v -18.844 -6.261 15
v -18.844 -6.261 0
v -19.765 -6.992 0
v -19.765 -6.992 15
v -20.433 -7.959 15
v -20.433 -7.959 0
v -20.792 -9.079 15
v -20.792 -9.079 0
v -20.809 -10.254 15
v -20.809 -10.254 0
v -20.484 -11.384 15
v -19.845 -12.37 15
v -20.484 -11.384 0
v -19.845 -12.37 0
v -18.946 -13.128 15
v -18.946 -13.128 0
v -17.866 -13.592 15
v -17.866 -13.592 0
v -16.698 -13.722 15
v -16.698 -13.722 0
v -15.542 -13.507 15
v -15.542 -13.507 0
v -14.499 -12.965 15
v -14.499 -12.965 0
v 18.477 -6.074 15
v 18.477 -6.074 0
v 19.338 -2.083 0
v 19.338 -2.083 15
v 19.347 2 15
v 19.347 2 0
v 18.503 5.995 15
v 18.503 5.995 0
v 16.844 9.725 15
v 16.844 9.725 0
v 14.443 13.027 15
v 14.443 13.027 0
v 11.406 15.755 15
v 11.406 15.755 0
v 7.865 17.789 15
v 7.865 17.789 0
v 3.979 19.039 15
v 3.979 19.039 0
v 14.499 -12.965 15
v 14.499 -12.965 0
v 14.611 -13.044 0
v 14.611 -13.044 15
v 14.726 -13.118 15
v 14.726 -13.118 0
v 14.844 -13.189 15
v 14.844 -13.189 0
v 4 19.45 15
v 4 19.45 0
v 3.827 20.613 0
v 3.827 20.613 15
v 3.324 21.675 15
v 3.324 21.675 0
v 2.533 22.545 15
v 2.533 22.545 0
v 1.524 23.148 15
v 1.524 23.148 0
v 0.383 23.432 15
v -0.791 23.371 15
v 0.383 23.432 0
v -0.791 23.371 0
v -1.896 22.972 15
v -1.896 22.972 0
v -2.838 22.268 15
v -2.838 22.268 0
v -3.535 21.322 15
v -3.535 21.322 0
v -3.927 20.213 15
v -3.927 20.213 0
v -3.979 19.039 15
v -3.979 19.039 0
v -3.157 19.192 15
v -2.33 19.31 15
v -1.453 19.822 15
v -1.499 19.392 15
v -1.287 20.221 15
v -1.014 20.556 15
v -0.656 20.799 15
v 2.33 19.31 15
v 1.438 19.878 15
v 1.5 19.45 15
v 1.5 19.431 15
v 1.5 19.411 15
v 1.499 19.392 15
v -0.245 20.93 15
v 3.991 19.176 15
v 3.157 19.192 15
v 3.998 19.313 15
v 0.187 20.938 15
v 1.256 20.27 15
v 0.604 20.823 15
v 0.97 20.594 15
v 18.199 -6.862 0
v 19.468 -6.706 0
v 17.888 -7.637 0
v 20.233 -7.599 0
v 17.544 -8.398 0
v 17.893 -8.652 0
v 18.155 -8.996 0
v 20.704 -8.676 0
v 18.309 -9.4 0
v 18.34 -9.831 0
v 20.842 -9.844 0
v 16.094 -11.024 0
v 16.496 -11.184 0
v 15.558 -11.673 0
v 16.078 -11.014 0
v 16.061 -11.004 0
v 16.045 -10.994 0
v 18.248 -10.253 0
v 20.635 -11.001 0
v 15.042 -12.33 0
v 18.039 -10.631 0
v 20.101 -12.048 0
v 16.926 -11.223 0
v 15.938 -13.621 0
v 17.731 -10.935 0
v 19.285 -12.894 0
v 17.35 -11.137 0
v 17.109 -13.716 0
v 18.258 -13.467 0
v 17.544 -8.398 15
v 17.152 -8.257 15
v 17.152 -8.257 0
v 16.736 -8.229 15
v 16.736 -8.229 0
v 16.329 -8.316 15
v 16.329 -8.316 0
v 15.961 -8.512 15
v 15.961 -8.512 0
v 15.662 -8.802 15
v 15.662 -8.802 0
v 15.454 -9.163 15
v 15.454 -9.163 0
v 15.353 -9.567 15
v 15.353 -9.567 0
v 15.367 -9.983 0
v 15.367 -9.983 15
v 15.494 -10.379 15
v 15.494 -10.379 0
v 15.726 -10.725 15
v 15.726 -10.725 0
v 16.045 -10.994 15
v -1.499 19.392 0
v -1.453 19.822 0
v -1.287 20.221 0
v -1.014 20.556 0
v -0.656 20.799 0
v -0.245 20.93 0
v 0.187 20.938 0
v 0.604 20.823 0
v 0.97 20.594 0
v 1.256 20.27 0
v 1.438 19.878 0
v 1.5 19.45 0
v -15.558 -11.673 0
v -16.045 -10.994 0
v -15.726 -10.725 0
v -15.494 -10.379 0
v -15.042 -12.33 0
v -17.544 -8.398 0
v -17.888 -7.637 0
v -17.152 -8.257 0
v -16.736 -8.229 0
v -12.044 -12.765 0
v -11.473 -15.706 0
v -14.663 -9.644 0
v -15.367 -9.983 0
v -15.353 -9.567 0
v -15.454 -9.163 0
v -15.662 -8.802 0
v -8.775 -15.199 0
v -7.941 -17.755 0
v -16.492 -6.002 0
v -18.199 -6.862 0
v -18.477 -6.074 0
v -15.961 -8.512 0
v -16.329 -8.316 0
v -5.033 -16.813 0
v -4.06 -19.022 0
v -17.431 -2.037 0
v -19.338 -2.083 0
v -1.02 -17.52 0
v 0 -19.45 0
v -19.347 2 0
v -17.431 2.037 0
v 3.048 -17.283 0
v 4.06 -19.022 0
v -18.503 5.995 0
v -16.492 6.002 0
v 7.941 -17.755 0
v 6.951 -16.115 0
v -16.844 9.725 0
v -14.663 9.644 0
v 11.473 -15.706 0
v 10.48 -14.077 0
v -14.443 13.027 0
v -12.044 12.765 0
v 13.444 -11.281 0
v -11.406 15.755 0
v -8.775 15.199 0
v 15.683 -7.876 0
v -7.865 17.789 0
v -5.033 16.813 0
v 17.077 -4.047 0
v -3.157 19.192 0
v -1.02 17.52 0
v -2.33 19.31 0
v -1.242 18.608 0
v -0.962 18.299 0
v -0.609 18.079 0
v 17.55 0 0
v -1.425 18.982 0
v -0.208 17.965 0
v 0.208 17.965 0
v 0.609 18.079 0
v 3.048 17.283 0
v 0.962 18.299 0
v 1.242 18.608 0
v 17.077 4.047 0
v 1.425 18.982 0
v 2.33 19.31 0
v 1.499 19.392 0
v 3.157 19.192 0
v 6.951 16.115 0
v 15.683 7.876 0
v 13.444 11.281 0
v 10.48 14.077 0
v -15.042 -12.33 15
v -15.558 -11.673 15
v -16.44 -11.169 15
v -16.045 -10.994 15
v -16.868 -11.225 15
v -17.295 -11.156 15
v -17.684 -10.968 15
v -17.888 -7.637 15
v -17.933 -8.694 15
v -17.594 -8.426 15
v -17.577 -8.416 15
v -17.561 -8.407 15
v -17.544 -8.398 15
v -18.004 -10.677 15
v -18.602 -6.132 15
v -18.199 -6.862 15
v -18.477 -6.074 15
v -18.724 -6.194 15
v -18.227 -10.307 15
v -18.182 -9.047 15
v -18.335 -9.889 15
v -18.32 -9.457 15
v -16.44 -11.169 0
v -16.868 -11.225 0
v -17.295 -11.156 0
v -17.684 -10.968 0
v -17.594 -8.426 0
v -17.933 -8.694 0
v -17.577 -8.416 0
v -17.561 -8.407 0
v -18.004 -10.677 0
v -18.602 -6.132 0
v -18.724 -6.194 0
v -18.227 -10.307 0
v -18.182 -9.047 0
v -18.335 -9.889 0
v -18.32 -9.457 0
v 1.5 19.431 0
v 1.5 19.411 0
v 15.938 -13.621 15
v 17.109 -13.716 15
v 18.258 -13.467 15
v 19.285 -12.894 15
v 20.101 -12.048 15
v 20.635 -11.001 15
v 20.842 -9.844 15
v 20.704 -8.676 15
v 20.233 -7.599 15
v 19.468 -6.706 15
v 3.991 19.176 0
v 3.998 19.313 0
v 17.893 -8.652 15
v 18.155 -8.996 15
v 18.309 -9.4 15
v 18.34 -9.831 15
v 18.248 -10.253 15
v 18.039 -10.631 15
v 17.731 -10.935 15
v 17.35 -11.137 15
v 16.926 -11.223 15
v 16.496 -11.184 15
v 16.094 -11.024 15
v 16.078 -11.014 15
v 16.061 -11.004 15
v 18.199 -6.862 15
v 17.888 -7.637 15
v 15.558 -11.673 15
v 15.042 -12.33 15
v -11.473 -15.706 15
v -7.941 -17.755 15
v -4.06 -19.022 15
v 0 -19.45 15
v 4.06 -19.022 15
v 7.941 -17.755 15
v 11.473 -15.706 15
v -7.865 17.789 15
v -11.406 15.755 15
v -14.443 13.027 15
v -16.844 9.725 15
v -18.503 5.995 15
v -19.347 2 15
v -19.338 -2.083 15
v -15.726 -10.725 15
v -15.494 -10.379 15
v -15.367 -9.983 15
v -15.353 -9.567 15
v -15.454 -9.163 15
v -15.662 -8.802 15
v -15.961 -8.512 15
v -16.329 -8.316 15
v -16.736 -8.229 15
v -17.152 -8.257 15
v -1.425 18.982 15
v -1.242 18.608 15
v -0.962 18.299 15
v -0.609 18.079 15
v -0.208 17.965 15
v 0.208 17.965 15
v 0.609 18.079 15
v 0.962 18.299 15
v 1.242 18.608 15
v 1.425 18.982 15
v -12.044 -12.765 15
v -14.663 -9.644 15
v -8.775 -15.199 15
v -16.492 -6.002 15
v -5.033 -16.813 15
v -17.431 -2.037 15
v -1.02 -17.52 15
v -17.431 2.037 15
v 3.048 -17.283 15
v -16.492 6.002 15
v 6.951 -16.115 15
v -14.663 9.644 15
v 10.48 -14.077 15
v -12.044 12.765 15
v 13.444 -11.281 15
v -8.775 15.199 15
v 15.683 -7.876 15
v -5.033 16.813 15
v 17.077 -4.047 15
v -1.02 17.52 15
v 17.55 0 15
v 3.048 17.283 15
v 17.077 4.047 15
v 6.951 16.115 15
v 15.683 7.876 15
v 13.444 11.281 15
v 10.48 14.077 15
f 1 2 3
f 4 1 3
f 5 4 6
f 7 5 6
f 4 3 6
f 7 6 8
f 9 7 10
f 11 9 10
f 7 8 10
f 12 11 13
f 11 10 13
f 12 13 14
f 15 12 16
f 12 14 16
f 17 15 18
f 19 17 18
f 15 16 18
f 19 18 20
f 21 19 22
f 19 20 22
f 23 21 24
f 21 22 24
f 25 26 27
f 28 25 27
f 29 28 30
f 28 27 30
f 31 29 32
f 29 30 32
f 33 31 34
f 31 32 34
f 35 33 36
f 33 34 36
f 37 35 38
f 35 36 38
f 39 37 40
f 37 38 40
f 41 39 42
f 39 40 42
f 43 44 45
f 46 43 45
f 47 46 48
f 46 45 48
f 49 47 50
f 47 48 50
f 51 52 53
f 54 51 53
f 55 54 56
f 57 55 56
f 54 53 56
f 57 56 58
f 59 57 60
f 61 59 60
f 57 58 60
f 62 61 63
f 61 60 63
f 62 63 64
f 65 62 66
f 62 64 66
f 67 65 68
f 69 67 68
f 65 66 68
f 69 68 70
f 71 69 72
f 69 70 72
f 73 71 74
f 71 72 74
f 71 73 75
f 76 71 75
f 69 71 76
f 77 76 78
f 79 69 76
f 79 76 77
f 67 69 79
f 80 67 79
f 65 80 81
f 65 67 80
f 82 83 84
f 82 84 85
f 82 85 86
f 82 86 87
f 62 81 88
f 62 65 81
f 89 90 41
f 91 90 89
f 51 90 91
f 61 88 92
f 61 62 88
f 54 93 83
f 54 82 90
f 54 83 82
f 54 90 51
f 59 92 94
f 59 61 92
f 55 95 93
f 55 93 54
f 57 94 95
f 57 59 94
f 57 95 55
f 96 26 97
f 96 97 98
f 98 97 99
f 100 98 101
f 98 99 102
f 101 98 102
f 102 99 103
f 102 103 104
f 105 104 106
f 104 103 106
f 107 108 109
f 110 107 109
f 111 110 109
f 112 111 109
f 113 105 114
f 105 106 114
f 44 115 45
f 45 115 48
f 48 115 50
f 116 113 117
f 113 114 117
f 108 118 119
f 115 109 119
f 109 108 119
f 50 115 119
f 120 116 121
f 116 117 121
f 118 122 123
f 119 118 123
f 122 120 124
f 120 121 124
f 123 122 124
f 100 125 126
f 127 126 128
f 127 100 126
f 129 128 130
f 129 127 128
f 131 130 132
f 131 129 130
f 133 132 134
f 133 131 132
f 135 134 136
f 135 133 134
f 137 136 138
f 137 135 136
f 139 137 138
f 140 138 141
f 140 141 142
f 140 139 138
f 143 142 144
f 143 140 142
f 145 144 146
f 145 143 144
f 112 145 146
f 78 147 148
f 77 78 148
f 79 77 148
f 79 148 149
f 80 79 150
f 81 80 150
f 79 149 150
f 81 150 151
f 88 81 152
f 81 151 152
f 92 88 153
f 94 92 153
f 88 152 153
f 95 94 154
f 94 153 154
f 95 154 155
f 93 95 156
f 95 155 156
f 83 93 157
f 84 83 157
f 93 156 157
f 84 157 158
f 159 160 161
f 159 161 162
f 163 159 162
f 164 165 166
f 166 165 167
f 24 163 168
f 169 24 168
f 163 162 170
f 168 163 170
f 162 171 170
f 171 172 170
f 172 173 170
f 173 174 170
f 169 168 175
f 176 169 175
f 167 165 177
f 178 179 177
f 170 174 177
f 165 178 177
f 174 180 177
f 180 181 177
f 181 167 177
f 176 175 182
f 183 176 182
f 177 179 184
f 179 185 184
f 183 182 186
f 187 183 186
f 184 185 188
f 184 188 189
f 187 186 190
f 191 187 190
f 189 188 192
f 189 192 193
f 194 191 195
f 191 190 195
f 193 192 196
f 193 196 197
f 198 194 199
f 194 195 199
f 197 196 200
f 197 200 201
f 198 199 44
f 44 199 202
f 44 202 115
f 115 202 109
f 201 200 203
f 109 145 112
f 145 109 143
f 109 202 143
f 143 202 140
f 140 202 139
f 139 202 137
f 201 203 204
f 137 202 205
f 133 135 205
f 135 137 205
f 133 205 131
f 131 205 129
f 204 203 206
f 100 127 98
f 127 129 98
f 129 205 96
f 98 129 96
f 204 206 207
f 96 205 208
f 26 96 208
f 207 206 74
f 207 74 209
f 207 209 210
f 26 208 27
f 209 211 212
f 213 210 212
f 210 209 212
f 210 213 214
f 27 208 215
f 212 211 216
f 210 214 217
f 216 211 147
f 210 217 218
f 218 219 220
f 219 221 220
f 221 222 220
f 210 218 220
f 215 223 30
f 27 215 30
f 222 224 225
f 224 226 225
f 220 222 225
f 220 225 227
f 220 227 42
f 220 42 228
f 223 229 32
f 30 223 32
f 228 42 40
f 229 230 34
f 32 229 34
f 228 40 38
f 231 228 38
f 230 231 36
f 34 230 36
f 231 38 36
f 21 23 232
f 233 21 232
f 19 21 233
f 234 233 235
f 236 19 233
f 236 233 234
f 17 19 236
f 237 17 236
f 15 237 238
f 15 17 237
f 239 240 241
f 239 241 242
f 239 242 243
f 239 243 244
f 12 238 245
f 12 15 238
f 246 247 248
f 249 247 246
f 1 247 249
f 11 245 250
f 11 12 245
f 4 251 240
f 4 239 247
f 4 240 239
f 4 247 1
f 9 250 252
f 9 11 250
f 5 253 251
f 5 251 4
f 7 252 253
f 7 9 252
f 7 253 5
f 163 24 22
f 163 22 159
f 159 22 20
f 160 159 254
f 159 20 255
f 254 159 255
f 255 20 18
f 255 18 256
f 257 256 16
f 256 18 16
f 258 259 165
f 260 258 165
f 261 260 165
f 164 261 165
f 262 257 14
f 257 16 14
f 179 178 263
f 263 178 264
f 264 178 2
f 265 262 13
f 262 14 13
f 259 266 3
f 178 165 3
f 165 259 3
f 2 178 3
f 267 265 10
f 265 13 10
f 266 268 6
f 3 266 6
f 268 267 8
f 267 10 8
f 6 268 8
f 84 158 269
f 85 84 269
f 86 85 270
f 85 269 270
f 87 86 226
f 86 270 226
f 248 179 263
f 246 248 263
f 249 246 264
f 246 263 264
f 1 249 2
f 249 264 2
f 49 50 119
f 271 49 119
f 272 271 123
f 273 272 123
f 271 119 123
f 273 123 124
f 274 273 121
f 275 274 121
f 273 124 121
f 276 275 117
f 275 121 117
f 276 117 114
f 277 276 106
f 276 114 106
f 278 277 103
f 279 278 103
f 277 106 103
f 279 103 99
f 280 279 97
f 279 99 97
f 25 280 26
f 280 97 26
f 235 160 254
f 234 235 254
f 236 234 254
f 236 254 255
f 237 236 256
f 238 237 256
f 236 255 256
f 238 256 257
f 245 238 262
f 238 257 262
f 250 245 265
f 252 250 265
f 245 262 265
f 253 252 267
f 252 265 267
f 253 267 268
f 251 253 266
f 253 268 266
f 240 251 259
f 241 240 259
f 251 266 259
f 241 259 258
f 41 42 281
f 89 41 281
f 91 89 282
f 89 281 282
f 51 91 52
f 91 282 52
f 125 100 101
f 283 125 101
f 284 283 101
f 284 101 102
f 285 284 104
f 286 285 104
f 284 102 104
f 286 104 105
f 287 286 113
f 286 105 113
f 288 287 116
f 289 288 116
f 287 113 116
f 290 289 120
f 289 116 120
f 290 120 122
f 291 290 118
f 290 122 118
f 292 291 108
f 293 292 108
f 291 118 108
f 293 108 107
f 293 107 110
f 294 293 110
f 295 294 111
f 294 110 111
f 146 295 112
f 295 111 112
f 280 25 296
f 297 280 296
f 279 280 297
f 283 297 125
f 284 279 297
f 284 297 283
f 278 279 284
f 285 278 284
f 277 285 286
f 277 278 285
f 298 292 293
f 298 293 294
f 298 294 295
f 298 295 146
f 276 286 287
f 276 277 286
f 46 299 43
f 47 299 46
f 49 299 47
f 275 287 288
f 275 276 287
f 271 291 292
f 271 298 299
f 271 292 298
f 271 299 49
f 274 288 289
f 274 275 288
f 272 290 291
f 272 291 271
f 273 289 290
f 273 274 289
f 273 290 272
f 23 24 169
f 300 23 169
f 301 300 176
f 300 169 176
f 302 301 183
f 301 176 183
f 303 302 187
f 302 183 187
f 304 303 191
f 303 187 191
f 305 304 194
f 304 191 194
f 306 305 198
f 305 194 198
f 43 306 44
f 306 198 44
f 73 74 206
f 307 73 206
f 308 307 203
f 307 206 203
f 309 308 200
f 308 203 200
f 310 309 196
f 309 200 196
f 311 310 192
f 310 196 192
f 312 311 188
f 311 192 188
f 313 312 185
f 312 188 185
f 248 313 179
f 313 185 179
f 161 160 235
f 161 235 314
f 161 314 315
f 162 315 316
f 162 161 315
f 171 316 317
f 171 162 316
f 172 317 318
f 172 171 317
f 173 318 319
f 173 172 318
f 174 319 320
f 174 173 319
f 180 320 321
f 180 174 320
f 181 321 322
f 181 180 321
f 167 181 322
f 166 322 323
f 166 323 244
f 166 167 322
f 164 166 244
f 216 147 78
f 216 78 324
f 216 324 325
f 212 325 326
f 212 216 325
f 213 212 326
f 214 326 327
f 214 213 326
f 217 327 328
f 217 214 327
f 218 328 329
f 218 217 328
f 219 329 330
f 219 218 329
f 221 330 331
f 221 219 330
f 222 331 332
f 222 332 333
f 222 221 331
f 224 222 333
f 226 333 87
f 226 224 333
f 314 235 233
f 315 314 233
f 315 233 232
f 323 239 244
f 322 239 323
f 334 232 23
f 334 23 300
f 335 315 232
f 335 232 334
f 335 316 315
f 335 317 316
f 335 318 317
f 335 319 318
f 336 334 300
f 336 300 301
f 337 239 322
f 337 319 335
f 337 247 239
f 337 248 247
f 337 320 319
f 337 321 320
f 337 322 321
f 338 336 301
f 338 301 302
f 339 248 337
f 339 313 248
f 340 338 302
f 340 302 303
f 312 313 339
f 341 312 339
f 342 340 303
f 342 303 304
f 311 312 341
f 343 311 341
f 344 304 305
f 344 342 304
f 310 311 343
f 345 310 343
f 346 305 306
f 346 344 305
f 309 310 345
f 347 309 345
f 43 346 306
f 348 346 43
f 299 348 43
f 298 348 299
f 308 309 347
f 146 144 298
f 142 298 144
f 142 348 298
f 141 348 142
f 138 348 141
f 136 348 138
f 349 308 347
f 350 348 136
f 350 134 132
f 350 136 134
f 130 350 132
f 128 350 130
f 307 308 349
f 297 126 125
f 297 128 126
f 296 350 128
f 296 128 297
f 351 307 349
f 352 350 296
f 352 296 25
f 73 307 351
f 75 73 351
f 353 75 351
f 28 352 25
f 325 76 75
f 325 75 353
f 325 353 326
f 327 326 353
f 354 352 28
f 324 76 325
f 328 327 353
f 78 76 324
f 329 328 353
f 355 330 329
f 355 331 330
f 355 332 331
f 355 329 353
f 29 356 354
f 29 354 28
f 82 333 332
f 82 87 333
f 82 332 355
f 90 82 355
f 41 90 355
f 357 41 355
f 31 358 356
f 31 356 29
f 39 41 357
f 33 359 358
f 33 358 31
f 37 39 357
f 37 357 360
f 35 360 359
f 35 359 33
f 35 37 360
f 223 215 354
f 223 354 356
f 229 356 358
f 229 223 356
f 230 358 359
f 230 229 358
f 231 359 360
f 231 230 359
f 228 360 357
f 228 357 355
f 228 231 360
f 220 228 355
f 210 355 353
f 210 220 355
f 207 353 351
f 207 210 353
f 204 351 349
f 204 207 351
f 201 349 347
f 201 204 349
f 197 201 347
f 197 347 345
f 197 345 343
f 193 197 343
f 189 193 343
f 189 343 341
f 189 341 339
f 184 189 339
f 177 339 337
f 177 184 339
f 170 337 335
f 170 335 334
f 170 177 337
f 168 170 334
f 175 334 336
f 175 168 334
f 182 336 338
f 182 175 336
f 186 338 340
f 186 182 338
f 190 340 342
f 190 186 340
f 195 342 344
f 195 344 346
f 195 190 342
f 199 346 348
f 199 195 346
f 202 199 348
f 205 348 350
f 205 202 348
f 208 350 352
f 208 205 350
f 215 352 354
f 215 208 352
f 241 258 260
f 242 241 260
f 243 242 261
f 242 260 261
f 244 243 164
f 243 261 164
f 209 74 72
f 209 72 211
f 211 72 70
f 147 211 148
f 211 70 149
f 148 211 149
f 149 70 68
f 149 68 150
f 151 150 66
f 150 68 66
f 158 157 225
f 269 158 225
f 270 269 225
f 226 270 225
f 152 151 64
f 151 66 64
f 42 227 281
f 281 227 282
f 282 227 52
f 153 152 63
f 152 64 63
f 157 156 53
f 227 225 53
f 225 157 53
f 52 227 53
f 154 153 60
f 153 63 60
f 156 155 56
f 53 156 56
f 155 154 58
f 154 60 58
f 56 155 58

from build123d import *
from build123d.topology import SkipClean

# Parameters (mm, degrees)
ESQUISSE1_R                                = 19.45
ESQUISSE1_R_2                              = 17.55
BOSS_EXTRU_1_DEPTH                         = 15
ESQUISSE1_5_R                              = 1.5
ENL_V_MAT_EXTRU_1_DEPTH                    = 15
BOSS_EXTRU_2_DEPTH                         = 15
R_P_TITION_CIRCULAIRE1_COUNT               = 2
R_P_TITION_CIRCULAIRE1_ANGLE               = 120
R_P_TITION_CIRCULAIRE1_THE_OTHER_WAY_COUNT = 2
R_P_TITION_CIRCULAIRE1_THE_OTHER_WAY_ANGLE = 120


with BuildPart() as part:
    # Esquisse1 → Boss.-Extru.1 (new body)
    with BuildSketch(Plane.XY):
        Circle(ESQUISSE1_R)
        Circle(ESQUISSE1_R_2, mode=Mode.SUBTRACT)
    extrude(amount=BOSS_EXTRU_1_DEPTH)

    # Esquisse1<5> → Enlèv. mat.-Extru.1 (cut)
    with BuildSketch(Plane.XY):
        with Locations((0, 19.45)):
            Circle(ESQUISSE1_5_R)
    enl_v_mat_extru_1 = extrude(amount=ENL_V_MAT_EXTRU_1_DEPTH, mode=Mode.SUBTRACT)

    # Esquisse1<6> → Boss.-Extru.2 (add)
    with SkipClean():  # the faces are left unmerged after this step: merging them gives an invalid solid
        with BuildSketch(Plane.XY):
            with BuildLine():
                ThreePointArc((-1.498884406, 19.392159383), (-0.028925687, 20.949721076), (1.5, 19.45))
                ThreePointArc((1.5, 19.45), (1.499721076, 19.421074313), (1.498884406, 19.392159383))
                ThreePointArc((1.498884406, 19.392159383), (2.744536924, 19.255389299), (3.978796705, 19.038688946))
                ThreePointArc((3.978796705, 19.038688946), (3.994695659, 19.244071394), (4, 19.45))
                ThreePointArc((4, 19.45), (-0.205928606, 23.444695659), (-3.978796705, 19.038688946))
                ThreePointArc((-3.978796705, 19.038688946), (-2.744536924, 19.255389299), (-1.498884406, 19.392159383))
            make_face()
        boss_extru_2 = extrude(amount=BOSS_EXTRU_2_DEPTH)

    # Répétition circulaire1: Enlèv. mat.-Extru.1, Boss.-Extru.2 ×2 about axis
    with SkipClean():  # the faces are left unmerged after this step: merging them gives an invalid solid
        r_p_tition_circulaire1_axis = Axis((0, 0, 15), (0, 0, -1))
        add([enl_v_mat_extru_1.rotate(r_p_tition_circulaire1_axis, i * R_P_TITION_CIRCULAIRE1_ANGLE / (R_P_TITION_CIRCULAIRE1_COUNT - 1)) for i in range(1, R_P_TITION_CIRCULAIRE1_COUNT)], mode=Mode.SUBTRACT)
        add([boss_extru_2.rotate(r_p_tition_circulaire1_axis, i * R_P_TITION_CIRCULAIRE1_ANGLE / (R_P_TITION_CIRCULAIRE1_COUNT - 1)) for i in range(1, R_P_TITION_CIRCULAIRE1_COUNT)])

    # Répétition circulaire1 the other way: Enlèv. mat.-Extru.1, Boss.-Extru.2 ×2 about axis
    with SkipClean():  # the faces are left unmerged after this step: merging them gives an invalid solid
        r_p_tition_circulaire1_the_other_way_axis = Axis((0, 0, 15), (0, 0, 1))
        add([enl_v_mat_extru_1.rotate(r_p_tition_circulaire1_the_other_way_axis, i * R_P_TITION_CIRCULAIRE1_THE_OTHER_WAY_ANGLE / (R_P_TITION_CIRCULAIRE1_THE_OTHER_WAY_COUNT - 1)) for i in range(1, R_P_TITION_CIRCULAIRE1_THE_OTHER_WAY_COUNT)], mode=Mode.SUBTRACT)
        add([boss_extru_2.rotate(r_p_tition_circulaire1_the_other_way_axis, i * R_P_TITION_CIRCULAIRE1_THE_OTHER_WAY_ANGLE / (R_P_TITION_CIRCULAIRE1_THE_OTHER_WAY_COUNT - 1)) for i in range(1, R_P_TITION_CIRCULAIRE1_THE_OTHER_WAY_COUNT)])


solid = part.part
